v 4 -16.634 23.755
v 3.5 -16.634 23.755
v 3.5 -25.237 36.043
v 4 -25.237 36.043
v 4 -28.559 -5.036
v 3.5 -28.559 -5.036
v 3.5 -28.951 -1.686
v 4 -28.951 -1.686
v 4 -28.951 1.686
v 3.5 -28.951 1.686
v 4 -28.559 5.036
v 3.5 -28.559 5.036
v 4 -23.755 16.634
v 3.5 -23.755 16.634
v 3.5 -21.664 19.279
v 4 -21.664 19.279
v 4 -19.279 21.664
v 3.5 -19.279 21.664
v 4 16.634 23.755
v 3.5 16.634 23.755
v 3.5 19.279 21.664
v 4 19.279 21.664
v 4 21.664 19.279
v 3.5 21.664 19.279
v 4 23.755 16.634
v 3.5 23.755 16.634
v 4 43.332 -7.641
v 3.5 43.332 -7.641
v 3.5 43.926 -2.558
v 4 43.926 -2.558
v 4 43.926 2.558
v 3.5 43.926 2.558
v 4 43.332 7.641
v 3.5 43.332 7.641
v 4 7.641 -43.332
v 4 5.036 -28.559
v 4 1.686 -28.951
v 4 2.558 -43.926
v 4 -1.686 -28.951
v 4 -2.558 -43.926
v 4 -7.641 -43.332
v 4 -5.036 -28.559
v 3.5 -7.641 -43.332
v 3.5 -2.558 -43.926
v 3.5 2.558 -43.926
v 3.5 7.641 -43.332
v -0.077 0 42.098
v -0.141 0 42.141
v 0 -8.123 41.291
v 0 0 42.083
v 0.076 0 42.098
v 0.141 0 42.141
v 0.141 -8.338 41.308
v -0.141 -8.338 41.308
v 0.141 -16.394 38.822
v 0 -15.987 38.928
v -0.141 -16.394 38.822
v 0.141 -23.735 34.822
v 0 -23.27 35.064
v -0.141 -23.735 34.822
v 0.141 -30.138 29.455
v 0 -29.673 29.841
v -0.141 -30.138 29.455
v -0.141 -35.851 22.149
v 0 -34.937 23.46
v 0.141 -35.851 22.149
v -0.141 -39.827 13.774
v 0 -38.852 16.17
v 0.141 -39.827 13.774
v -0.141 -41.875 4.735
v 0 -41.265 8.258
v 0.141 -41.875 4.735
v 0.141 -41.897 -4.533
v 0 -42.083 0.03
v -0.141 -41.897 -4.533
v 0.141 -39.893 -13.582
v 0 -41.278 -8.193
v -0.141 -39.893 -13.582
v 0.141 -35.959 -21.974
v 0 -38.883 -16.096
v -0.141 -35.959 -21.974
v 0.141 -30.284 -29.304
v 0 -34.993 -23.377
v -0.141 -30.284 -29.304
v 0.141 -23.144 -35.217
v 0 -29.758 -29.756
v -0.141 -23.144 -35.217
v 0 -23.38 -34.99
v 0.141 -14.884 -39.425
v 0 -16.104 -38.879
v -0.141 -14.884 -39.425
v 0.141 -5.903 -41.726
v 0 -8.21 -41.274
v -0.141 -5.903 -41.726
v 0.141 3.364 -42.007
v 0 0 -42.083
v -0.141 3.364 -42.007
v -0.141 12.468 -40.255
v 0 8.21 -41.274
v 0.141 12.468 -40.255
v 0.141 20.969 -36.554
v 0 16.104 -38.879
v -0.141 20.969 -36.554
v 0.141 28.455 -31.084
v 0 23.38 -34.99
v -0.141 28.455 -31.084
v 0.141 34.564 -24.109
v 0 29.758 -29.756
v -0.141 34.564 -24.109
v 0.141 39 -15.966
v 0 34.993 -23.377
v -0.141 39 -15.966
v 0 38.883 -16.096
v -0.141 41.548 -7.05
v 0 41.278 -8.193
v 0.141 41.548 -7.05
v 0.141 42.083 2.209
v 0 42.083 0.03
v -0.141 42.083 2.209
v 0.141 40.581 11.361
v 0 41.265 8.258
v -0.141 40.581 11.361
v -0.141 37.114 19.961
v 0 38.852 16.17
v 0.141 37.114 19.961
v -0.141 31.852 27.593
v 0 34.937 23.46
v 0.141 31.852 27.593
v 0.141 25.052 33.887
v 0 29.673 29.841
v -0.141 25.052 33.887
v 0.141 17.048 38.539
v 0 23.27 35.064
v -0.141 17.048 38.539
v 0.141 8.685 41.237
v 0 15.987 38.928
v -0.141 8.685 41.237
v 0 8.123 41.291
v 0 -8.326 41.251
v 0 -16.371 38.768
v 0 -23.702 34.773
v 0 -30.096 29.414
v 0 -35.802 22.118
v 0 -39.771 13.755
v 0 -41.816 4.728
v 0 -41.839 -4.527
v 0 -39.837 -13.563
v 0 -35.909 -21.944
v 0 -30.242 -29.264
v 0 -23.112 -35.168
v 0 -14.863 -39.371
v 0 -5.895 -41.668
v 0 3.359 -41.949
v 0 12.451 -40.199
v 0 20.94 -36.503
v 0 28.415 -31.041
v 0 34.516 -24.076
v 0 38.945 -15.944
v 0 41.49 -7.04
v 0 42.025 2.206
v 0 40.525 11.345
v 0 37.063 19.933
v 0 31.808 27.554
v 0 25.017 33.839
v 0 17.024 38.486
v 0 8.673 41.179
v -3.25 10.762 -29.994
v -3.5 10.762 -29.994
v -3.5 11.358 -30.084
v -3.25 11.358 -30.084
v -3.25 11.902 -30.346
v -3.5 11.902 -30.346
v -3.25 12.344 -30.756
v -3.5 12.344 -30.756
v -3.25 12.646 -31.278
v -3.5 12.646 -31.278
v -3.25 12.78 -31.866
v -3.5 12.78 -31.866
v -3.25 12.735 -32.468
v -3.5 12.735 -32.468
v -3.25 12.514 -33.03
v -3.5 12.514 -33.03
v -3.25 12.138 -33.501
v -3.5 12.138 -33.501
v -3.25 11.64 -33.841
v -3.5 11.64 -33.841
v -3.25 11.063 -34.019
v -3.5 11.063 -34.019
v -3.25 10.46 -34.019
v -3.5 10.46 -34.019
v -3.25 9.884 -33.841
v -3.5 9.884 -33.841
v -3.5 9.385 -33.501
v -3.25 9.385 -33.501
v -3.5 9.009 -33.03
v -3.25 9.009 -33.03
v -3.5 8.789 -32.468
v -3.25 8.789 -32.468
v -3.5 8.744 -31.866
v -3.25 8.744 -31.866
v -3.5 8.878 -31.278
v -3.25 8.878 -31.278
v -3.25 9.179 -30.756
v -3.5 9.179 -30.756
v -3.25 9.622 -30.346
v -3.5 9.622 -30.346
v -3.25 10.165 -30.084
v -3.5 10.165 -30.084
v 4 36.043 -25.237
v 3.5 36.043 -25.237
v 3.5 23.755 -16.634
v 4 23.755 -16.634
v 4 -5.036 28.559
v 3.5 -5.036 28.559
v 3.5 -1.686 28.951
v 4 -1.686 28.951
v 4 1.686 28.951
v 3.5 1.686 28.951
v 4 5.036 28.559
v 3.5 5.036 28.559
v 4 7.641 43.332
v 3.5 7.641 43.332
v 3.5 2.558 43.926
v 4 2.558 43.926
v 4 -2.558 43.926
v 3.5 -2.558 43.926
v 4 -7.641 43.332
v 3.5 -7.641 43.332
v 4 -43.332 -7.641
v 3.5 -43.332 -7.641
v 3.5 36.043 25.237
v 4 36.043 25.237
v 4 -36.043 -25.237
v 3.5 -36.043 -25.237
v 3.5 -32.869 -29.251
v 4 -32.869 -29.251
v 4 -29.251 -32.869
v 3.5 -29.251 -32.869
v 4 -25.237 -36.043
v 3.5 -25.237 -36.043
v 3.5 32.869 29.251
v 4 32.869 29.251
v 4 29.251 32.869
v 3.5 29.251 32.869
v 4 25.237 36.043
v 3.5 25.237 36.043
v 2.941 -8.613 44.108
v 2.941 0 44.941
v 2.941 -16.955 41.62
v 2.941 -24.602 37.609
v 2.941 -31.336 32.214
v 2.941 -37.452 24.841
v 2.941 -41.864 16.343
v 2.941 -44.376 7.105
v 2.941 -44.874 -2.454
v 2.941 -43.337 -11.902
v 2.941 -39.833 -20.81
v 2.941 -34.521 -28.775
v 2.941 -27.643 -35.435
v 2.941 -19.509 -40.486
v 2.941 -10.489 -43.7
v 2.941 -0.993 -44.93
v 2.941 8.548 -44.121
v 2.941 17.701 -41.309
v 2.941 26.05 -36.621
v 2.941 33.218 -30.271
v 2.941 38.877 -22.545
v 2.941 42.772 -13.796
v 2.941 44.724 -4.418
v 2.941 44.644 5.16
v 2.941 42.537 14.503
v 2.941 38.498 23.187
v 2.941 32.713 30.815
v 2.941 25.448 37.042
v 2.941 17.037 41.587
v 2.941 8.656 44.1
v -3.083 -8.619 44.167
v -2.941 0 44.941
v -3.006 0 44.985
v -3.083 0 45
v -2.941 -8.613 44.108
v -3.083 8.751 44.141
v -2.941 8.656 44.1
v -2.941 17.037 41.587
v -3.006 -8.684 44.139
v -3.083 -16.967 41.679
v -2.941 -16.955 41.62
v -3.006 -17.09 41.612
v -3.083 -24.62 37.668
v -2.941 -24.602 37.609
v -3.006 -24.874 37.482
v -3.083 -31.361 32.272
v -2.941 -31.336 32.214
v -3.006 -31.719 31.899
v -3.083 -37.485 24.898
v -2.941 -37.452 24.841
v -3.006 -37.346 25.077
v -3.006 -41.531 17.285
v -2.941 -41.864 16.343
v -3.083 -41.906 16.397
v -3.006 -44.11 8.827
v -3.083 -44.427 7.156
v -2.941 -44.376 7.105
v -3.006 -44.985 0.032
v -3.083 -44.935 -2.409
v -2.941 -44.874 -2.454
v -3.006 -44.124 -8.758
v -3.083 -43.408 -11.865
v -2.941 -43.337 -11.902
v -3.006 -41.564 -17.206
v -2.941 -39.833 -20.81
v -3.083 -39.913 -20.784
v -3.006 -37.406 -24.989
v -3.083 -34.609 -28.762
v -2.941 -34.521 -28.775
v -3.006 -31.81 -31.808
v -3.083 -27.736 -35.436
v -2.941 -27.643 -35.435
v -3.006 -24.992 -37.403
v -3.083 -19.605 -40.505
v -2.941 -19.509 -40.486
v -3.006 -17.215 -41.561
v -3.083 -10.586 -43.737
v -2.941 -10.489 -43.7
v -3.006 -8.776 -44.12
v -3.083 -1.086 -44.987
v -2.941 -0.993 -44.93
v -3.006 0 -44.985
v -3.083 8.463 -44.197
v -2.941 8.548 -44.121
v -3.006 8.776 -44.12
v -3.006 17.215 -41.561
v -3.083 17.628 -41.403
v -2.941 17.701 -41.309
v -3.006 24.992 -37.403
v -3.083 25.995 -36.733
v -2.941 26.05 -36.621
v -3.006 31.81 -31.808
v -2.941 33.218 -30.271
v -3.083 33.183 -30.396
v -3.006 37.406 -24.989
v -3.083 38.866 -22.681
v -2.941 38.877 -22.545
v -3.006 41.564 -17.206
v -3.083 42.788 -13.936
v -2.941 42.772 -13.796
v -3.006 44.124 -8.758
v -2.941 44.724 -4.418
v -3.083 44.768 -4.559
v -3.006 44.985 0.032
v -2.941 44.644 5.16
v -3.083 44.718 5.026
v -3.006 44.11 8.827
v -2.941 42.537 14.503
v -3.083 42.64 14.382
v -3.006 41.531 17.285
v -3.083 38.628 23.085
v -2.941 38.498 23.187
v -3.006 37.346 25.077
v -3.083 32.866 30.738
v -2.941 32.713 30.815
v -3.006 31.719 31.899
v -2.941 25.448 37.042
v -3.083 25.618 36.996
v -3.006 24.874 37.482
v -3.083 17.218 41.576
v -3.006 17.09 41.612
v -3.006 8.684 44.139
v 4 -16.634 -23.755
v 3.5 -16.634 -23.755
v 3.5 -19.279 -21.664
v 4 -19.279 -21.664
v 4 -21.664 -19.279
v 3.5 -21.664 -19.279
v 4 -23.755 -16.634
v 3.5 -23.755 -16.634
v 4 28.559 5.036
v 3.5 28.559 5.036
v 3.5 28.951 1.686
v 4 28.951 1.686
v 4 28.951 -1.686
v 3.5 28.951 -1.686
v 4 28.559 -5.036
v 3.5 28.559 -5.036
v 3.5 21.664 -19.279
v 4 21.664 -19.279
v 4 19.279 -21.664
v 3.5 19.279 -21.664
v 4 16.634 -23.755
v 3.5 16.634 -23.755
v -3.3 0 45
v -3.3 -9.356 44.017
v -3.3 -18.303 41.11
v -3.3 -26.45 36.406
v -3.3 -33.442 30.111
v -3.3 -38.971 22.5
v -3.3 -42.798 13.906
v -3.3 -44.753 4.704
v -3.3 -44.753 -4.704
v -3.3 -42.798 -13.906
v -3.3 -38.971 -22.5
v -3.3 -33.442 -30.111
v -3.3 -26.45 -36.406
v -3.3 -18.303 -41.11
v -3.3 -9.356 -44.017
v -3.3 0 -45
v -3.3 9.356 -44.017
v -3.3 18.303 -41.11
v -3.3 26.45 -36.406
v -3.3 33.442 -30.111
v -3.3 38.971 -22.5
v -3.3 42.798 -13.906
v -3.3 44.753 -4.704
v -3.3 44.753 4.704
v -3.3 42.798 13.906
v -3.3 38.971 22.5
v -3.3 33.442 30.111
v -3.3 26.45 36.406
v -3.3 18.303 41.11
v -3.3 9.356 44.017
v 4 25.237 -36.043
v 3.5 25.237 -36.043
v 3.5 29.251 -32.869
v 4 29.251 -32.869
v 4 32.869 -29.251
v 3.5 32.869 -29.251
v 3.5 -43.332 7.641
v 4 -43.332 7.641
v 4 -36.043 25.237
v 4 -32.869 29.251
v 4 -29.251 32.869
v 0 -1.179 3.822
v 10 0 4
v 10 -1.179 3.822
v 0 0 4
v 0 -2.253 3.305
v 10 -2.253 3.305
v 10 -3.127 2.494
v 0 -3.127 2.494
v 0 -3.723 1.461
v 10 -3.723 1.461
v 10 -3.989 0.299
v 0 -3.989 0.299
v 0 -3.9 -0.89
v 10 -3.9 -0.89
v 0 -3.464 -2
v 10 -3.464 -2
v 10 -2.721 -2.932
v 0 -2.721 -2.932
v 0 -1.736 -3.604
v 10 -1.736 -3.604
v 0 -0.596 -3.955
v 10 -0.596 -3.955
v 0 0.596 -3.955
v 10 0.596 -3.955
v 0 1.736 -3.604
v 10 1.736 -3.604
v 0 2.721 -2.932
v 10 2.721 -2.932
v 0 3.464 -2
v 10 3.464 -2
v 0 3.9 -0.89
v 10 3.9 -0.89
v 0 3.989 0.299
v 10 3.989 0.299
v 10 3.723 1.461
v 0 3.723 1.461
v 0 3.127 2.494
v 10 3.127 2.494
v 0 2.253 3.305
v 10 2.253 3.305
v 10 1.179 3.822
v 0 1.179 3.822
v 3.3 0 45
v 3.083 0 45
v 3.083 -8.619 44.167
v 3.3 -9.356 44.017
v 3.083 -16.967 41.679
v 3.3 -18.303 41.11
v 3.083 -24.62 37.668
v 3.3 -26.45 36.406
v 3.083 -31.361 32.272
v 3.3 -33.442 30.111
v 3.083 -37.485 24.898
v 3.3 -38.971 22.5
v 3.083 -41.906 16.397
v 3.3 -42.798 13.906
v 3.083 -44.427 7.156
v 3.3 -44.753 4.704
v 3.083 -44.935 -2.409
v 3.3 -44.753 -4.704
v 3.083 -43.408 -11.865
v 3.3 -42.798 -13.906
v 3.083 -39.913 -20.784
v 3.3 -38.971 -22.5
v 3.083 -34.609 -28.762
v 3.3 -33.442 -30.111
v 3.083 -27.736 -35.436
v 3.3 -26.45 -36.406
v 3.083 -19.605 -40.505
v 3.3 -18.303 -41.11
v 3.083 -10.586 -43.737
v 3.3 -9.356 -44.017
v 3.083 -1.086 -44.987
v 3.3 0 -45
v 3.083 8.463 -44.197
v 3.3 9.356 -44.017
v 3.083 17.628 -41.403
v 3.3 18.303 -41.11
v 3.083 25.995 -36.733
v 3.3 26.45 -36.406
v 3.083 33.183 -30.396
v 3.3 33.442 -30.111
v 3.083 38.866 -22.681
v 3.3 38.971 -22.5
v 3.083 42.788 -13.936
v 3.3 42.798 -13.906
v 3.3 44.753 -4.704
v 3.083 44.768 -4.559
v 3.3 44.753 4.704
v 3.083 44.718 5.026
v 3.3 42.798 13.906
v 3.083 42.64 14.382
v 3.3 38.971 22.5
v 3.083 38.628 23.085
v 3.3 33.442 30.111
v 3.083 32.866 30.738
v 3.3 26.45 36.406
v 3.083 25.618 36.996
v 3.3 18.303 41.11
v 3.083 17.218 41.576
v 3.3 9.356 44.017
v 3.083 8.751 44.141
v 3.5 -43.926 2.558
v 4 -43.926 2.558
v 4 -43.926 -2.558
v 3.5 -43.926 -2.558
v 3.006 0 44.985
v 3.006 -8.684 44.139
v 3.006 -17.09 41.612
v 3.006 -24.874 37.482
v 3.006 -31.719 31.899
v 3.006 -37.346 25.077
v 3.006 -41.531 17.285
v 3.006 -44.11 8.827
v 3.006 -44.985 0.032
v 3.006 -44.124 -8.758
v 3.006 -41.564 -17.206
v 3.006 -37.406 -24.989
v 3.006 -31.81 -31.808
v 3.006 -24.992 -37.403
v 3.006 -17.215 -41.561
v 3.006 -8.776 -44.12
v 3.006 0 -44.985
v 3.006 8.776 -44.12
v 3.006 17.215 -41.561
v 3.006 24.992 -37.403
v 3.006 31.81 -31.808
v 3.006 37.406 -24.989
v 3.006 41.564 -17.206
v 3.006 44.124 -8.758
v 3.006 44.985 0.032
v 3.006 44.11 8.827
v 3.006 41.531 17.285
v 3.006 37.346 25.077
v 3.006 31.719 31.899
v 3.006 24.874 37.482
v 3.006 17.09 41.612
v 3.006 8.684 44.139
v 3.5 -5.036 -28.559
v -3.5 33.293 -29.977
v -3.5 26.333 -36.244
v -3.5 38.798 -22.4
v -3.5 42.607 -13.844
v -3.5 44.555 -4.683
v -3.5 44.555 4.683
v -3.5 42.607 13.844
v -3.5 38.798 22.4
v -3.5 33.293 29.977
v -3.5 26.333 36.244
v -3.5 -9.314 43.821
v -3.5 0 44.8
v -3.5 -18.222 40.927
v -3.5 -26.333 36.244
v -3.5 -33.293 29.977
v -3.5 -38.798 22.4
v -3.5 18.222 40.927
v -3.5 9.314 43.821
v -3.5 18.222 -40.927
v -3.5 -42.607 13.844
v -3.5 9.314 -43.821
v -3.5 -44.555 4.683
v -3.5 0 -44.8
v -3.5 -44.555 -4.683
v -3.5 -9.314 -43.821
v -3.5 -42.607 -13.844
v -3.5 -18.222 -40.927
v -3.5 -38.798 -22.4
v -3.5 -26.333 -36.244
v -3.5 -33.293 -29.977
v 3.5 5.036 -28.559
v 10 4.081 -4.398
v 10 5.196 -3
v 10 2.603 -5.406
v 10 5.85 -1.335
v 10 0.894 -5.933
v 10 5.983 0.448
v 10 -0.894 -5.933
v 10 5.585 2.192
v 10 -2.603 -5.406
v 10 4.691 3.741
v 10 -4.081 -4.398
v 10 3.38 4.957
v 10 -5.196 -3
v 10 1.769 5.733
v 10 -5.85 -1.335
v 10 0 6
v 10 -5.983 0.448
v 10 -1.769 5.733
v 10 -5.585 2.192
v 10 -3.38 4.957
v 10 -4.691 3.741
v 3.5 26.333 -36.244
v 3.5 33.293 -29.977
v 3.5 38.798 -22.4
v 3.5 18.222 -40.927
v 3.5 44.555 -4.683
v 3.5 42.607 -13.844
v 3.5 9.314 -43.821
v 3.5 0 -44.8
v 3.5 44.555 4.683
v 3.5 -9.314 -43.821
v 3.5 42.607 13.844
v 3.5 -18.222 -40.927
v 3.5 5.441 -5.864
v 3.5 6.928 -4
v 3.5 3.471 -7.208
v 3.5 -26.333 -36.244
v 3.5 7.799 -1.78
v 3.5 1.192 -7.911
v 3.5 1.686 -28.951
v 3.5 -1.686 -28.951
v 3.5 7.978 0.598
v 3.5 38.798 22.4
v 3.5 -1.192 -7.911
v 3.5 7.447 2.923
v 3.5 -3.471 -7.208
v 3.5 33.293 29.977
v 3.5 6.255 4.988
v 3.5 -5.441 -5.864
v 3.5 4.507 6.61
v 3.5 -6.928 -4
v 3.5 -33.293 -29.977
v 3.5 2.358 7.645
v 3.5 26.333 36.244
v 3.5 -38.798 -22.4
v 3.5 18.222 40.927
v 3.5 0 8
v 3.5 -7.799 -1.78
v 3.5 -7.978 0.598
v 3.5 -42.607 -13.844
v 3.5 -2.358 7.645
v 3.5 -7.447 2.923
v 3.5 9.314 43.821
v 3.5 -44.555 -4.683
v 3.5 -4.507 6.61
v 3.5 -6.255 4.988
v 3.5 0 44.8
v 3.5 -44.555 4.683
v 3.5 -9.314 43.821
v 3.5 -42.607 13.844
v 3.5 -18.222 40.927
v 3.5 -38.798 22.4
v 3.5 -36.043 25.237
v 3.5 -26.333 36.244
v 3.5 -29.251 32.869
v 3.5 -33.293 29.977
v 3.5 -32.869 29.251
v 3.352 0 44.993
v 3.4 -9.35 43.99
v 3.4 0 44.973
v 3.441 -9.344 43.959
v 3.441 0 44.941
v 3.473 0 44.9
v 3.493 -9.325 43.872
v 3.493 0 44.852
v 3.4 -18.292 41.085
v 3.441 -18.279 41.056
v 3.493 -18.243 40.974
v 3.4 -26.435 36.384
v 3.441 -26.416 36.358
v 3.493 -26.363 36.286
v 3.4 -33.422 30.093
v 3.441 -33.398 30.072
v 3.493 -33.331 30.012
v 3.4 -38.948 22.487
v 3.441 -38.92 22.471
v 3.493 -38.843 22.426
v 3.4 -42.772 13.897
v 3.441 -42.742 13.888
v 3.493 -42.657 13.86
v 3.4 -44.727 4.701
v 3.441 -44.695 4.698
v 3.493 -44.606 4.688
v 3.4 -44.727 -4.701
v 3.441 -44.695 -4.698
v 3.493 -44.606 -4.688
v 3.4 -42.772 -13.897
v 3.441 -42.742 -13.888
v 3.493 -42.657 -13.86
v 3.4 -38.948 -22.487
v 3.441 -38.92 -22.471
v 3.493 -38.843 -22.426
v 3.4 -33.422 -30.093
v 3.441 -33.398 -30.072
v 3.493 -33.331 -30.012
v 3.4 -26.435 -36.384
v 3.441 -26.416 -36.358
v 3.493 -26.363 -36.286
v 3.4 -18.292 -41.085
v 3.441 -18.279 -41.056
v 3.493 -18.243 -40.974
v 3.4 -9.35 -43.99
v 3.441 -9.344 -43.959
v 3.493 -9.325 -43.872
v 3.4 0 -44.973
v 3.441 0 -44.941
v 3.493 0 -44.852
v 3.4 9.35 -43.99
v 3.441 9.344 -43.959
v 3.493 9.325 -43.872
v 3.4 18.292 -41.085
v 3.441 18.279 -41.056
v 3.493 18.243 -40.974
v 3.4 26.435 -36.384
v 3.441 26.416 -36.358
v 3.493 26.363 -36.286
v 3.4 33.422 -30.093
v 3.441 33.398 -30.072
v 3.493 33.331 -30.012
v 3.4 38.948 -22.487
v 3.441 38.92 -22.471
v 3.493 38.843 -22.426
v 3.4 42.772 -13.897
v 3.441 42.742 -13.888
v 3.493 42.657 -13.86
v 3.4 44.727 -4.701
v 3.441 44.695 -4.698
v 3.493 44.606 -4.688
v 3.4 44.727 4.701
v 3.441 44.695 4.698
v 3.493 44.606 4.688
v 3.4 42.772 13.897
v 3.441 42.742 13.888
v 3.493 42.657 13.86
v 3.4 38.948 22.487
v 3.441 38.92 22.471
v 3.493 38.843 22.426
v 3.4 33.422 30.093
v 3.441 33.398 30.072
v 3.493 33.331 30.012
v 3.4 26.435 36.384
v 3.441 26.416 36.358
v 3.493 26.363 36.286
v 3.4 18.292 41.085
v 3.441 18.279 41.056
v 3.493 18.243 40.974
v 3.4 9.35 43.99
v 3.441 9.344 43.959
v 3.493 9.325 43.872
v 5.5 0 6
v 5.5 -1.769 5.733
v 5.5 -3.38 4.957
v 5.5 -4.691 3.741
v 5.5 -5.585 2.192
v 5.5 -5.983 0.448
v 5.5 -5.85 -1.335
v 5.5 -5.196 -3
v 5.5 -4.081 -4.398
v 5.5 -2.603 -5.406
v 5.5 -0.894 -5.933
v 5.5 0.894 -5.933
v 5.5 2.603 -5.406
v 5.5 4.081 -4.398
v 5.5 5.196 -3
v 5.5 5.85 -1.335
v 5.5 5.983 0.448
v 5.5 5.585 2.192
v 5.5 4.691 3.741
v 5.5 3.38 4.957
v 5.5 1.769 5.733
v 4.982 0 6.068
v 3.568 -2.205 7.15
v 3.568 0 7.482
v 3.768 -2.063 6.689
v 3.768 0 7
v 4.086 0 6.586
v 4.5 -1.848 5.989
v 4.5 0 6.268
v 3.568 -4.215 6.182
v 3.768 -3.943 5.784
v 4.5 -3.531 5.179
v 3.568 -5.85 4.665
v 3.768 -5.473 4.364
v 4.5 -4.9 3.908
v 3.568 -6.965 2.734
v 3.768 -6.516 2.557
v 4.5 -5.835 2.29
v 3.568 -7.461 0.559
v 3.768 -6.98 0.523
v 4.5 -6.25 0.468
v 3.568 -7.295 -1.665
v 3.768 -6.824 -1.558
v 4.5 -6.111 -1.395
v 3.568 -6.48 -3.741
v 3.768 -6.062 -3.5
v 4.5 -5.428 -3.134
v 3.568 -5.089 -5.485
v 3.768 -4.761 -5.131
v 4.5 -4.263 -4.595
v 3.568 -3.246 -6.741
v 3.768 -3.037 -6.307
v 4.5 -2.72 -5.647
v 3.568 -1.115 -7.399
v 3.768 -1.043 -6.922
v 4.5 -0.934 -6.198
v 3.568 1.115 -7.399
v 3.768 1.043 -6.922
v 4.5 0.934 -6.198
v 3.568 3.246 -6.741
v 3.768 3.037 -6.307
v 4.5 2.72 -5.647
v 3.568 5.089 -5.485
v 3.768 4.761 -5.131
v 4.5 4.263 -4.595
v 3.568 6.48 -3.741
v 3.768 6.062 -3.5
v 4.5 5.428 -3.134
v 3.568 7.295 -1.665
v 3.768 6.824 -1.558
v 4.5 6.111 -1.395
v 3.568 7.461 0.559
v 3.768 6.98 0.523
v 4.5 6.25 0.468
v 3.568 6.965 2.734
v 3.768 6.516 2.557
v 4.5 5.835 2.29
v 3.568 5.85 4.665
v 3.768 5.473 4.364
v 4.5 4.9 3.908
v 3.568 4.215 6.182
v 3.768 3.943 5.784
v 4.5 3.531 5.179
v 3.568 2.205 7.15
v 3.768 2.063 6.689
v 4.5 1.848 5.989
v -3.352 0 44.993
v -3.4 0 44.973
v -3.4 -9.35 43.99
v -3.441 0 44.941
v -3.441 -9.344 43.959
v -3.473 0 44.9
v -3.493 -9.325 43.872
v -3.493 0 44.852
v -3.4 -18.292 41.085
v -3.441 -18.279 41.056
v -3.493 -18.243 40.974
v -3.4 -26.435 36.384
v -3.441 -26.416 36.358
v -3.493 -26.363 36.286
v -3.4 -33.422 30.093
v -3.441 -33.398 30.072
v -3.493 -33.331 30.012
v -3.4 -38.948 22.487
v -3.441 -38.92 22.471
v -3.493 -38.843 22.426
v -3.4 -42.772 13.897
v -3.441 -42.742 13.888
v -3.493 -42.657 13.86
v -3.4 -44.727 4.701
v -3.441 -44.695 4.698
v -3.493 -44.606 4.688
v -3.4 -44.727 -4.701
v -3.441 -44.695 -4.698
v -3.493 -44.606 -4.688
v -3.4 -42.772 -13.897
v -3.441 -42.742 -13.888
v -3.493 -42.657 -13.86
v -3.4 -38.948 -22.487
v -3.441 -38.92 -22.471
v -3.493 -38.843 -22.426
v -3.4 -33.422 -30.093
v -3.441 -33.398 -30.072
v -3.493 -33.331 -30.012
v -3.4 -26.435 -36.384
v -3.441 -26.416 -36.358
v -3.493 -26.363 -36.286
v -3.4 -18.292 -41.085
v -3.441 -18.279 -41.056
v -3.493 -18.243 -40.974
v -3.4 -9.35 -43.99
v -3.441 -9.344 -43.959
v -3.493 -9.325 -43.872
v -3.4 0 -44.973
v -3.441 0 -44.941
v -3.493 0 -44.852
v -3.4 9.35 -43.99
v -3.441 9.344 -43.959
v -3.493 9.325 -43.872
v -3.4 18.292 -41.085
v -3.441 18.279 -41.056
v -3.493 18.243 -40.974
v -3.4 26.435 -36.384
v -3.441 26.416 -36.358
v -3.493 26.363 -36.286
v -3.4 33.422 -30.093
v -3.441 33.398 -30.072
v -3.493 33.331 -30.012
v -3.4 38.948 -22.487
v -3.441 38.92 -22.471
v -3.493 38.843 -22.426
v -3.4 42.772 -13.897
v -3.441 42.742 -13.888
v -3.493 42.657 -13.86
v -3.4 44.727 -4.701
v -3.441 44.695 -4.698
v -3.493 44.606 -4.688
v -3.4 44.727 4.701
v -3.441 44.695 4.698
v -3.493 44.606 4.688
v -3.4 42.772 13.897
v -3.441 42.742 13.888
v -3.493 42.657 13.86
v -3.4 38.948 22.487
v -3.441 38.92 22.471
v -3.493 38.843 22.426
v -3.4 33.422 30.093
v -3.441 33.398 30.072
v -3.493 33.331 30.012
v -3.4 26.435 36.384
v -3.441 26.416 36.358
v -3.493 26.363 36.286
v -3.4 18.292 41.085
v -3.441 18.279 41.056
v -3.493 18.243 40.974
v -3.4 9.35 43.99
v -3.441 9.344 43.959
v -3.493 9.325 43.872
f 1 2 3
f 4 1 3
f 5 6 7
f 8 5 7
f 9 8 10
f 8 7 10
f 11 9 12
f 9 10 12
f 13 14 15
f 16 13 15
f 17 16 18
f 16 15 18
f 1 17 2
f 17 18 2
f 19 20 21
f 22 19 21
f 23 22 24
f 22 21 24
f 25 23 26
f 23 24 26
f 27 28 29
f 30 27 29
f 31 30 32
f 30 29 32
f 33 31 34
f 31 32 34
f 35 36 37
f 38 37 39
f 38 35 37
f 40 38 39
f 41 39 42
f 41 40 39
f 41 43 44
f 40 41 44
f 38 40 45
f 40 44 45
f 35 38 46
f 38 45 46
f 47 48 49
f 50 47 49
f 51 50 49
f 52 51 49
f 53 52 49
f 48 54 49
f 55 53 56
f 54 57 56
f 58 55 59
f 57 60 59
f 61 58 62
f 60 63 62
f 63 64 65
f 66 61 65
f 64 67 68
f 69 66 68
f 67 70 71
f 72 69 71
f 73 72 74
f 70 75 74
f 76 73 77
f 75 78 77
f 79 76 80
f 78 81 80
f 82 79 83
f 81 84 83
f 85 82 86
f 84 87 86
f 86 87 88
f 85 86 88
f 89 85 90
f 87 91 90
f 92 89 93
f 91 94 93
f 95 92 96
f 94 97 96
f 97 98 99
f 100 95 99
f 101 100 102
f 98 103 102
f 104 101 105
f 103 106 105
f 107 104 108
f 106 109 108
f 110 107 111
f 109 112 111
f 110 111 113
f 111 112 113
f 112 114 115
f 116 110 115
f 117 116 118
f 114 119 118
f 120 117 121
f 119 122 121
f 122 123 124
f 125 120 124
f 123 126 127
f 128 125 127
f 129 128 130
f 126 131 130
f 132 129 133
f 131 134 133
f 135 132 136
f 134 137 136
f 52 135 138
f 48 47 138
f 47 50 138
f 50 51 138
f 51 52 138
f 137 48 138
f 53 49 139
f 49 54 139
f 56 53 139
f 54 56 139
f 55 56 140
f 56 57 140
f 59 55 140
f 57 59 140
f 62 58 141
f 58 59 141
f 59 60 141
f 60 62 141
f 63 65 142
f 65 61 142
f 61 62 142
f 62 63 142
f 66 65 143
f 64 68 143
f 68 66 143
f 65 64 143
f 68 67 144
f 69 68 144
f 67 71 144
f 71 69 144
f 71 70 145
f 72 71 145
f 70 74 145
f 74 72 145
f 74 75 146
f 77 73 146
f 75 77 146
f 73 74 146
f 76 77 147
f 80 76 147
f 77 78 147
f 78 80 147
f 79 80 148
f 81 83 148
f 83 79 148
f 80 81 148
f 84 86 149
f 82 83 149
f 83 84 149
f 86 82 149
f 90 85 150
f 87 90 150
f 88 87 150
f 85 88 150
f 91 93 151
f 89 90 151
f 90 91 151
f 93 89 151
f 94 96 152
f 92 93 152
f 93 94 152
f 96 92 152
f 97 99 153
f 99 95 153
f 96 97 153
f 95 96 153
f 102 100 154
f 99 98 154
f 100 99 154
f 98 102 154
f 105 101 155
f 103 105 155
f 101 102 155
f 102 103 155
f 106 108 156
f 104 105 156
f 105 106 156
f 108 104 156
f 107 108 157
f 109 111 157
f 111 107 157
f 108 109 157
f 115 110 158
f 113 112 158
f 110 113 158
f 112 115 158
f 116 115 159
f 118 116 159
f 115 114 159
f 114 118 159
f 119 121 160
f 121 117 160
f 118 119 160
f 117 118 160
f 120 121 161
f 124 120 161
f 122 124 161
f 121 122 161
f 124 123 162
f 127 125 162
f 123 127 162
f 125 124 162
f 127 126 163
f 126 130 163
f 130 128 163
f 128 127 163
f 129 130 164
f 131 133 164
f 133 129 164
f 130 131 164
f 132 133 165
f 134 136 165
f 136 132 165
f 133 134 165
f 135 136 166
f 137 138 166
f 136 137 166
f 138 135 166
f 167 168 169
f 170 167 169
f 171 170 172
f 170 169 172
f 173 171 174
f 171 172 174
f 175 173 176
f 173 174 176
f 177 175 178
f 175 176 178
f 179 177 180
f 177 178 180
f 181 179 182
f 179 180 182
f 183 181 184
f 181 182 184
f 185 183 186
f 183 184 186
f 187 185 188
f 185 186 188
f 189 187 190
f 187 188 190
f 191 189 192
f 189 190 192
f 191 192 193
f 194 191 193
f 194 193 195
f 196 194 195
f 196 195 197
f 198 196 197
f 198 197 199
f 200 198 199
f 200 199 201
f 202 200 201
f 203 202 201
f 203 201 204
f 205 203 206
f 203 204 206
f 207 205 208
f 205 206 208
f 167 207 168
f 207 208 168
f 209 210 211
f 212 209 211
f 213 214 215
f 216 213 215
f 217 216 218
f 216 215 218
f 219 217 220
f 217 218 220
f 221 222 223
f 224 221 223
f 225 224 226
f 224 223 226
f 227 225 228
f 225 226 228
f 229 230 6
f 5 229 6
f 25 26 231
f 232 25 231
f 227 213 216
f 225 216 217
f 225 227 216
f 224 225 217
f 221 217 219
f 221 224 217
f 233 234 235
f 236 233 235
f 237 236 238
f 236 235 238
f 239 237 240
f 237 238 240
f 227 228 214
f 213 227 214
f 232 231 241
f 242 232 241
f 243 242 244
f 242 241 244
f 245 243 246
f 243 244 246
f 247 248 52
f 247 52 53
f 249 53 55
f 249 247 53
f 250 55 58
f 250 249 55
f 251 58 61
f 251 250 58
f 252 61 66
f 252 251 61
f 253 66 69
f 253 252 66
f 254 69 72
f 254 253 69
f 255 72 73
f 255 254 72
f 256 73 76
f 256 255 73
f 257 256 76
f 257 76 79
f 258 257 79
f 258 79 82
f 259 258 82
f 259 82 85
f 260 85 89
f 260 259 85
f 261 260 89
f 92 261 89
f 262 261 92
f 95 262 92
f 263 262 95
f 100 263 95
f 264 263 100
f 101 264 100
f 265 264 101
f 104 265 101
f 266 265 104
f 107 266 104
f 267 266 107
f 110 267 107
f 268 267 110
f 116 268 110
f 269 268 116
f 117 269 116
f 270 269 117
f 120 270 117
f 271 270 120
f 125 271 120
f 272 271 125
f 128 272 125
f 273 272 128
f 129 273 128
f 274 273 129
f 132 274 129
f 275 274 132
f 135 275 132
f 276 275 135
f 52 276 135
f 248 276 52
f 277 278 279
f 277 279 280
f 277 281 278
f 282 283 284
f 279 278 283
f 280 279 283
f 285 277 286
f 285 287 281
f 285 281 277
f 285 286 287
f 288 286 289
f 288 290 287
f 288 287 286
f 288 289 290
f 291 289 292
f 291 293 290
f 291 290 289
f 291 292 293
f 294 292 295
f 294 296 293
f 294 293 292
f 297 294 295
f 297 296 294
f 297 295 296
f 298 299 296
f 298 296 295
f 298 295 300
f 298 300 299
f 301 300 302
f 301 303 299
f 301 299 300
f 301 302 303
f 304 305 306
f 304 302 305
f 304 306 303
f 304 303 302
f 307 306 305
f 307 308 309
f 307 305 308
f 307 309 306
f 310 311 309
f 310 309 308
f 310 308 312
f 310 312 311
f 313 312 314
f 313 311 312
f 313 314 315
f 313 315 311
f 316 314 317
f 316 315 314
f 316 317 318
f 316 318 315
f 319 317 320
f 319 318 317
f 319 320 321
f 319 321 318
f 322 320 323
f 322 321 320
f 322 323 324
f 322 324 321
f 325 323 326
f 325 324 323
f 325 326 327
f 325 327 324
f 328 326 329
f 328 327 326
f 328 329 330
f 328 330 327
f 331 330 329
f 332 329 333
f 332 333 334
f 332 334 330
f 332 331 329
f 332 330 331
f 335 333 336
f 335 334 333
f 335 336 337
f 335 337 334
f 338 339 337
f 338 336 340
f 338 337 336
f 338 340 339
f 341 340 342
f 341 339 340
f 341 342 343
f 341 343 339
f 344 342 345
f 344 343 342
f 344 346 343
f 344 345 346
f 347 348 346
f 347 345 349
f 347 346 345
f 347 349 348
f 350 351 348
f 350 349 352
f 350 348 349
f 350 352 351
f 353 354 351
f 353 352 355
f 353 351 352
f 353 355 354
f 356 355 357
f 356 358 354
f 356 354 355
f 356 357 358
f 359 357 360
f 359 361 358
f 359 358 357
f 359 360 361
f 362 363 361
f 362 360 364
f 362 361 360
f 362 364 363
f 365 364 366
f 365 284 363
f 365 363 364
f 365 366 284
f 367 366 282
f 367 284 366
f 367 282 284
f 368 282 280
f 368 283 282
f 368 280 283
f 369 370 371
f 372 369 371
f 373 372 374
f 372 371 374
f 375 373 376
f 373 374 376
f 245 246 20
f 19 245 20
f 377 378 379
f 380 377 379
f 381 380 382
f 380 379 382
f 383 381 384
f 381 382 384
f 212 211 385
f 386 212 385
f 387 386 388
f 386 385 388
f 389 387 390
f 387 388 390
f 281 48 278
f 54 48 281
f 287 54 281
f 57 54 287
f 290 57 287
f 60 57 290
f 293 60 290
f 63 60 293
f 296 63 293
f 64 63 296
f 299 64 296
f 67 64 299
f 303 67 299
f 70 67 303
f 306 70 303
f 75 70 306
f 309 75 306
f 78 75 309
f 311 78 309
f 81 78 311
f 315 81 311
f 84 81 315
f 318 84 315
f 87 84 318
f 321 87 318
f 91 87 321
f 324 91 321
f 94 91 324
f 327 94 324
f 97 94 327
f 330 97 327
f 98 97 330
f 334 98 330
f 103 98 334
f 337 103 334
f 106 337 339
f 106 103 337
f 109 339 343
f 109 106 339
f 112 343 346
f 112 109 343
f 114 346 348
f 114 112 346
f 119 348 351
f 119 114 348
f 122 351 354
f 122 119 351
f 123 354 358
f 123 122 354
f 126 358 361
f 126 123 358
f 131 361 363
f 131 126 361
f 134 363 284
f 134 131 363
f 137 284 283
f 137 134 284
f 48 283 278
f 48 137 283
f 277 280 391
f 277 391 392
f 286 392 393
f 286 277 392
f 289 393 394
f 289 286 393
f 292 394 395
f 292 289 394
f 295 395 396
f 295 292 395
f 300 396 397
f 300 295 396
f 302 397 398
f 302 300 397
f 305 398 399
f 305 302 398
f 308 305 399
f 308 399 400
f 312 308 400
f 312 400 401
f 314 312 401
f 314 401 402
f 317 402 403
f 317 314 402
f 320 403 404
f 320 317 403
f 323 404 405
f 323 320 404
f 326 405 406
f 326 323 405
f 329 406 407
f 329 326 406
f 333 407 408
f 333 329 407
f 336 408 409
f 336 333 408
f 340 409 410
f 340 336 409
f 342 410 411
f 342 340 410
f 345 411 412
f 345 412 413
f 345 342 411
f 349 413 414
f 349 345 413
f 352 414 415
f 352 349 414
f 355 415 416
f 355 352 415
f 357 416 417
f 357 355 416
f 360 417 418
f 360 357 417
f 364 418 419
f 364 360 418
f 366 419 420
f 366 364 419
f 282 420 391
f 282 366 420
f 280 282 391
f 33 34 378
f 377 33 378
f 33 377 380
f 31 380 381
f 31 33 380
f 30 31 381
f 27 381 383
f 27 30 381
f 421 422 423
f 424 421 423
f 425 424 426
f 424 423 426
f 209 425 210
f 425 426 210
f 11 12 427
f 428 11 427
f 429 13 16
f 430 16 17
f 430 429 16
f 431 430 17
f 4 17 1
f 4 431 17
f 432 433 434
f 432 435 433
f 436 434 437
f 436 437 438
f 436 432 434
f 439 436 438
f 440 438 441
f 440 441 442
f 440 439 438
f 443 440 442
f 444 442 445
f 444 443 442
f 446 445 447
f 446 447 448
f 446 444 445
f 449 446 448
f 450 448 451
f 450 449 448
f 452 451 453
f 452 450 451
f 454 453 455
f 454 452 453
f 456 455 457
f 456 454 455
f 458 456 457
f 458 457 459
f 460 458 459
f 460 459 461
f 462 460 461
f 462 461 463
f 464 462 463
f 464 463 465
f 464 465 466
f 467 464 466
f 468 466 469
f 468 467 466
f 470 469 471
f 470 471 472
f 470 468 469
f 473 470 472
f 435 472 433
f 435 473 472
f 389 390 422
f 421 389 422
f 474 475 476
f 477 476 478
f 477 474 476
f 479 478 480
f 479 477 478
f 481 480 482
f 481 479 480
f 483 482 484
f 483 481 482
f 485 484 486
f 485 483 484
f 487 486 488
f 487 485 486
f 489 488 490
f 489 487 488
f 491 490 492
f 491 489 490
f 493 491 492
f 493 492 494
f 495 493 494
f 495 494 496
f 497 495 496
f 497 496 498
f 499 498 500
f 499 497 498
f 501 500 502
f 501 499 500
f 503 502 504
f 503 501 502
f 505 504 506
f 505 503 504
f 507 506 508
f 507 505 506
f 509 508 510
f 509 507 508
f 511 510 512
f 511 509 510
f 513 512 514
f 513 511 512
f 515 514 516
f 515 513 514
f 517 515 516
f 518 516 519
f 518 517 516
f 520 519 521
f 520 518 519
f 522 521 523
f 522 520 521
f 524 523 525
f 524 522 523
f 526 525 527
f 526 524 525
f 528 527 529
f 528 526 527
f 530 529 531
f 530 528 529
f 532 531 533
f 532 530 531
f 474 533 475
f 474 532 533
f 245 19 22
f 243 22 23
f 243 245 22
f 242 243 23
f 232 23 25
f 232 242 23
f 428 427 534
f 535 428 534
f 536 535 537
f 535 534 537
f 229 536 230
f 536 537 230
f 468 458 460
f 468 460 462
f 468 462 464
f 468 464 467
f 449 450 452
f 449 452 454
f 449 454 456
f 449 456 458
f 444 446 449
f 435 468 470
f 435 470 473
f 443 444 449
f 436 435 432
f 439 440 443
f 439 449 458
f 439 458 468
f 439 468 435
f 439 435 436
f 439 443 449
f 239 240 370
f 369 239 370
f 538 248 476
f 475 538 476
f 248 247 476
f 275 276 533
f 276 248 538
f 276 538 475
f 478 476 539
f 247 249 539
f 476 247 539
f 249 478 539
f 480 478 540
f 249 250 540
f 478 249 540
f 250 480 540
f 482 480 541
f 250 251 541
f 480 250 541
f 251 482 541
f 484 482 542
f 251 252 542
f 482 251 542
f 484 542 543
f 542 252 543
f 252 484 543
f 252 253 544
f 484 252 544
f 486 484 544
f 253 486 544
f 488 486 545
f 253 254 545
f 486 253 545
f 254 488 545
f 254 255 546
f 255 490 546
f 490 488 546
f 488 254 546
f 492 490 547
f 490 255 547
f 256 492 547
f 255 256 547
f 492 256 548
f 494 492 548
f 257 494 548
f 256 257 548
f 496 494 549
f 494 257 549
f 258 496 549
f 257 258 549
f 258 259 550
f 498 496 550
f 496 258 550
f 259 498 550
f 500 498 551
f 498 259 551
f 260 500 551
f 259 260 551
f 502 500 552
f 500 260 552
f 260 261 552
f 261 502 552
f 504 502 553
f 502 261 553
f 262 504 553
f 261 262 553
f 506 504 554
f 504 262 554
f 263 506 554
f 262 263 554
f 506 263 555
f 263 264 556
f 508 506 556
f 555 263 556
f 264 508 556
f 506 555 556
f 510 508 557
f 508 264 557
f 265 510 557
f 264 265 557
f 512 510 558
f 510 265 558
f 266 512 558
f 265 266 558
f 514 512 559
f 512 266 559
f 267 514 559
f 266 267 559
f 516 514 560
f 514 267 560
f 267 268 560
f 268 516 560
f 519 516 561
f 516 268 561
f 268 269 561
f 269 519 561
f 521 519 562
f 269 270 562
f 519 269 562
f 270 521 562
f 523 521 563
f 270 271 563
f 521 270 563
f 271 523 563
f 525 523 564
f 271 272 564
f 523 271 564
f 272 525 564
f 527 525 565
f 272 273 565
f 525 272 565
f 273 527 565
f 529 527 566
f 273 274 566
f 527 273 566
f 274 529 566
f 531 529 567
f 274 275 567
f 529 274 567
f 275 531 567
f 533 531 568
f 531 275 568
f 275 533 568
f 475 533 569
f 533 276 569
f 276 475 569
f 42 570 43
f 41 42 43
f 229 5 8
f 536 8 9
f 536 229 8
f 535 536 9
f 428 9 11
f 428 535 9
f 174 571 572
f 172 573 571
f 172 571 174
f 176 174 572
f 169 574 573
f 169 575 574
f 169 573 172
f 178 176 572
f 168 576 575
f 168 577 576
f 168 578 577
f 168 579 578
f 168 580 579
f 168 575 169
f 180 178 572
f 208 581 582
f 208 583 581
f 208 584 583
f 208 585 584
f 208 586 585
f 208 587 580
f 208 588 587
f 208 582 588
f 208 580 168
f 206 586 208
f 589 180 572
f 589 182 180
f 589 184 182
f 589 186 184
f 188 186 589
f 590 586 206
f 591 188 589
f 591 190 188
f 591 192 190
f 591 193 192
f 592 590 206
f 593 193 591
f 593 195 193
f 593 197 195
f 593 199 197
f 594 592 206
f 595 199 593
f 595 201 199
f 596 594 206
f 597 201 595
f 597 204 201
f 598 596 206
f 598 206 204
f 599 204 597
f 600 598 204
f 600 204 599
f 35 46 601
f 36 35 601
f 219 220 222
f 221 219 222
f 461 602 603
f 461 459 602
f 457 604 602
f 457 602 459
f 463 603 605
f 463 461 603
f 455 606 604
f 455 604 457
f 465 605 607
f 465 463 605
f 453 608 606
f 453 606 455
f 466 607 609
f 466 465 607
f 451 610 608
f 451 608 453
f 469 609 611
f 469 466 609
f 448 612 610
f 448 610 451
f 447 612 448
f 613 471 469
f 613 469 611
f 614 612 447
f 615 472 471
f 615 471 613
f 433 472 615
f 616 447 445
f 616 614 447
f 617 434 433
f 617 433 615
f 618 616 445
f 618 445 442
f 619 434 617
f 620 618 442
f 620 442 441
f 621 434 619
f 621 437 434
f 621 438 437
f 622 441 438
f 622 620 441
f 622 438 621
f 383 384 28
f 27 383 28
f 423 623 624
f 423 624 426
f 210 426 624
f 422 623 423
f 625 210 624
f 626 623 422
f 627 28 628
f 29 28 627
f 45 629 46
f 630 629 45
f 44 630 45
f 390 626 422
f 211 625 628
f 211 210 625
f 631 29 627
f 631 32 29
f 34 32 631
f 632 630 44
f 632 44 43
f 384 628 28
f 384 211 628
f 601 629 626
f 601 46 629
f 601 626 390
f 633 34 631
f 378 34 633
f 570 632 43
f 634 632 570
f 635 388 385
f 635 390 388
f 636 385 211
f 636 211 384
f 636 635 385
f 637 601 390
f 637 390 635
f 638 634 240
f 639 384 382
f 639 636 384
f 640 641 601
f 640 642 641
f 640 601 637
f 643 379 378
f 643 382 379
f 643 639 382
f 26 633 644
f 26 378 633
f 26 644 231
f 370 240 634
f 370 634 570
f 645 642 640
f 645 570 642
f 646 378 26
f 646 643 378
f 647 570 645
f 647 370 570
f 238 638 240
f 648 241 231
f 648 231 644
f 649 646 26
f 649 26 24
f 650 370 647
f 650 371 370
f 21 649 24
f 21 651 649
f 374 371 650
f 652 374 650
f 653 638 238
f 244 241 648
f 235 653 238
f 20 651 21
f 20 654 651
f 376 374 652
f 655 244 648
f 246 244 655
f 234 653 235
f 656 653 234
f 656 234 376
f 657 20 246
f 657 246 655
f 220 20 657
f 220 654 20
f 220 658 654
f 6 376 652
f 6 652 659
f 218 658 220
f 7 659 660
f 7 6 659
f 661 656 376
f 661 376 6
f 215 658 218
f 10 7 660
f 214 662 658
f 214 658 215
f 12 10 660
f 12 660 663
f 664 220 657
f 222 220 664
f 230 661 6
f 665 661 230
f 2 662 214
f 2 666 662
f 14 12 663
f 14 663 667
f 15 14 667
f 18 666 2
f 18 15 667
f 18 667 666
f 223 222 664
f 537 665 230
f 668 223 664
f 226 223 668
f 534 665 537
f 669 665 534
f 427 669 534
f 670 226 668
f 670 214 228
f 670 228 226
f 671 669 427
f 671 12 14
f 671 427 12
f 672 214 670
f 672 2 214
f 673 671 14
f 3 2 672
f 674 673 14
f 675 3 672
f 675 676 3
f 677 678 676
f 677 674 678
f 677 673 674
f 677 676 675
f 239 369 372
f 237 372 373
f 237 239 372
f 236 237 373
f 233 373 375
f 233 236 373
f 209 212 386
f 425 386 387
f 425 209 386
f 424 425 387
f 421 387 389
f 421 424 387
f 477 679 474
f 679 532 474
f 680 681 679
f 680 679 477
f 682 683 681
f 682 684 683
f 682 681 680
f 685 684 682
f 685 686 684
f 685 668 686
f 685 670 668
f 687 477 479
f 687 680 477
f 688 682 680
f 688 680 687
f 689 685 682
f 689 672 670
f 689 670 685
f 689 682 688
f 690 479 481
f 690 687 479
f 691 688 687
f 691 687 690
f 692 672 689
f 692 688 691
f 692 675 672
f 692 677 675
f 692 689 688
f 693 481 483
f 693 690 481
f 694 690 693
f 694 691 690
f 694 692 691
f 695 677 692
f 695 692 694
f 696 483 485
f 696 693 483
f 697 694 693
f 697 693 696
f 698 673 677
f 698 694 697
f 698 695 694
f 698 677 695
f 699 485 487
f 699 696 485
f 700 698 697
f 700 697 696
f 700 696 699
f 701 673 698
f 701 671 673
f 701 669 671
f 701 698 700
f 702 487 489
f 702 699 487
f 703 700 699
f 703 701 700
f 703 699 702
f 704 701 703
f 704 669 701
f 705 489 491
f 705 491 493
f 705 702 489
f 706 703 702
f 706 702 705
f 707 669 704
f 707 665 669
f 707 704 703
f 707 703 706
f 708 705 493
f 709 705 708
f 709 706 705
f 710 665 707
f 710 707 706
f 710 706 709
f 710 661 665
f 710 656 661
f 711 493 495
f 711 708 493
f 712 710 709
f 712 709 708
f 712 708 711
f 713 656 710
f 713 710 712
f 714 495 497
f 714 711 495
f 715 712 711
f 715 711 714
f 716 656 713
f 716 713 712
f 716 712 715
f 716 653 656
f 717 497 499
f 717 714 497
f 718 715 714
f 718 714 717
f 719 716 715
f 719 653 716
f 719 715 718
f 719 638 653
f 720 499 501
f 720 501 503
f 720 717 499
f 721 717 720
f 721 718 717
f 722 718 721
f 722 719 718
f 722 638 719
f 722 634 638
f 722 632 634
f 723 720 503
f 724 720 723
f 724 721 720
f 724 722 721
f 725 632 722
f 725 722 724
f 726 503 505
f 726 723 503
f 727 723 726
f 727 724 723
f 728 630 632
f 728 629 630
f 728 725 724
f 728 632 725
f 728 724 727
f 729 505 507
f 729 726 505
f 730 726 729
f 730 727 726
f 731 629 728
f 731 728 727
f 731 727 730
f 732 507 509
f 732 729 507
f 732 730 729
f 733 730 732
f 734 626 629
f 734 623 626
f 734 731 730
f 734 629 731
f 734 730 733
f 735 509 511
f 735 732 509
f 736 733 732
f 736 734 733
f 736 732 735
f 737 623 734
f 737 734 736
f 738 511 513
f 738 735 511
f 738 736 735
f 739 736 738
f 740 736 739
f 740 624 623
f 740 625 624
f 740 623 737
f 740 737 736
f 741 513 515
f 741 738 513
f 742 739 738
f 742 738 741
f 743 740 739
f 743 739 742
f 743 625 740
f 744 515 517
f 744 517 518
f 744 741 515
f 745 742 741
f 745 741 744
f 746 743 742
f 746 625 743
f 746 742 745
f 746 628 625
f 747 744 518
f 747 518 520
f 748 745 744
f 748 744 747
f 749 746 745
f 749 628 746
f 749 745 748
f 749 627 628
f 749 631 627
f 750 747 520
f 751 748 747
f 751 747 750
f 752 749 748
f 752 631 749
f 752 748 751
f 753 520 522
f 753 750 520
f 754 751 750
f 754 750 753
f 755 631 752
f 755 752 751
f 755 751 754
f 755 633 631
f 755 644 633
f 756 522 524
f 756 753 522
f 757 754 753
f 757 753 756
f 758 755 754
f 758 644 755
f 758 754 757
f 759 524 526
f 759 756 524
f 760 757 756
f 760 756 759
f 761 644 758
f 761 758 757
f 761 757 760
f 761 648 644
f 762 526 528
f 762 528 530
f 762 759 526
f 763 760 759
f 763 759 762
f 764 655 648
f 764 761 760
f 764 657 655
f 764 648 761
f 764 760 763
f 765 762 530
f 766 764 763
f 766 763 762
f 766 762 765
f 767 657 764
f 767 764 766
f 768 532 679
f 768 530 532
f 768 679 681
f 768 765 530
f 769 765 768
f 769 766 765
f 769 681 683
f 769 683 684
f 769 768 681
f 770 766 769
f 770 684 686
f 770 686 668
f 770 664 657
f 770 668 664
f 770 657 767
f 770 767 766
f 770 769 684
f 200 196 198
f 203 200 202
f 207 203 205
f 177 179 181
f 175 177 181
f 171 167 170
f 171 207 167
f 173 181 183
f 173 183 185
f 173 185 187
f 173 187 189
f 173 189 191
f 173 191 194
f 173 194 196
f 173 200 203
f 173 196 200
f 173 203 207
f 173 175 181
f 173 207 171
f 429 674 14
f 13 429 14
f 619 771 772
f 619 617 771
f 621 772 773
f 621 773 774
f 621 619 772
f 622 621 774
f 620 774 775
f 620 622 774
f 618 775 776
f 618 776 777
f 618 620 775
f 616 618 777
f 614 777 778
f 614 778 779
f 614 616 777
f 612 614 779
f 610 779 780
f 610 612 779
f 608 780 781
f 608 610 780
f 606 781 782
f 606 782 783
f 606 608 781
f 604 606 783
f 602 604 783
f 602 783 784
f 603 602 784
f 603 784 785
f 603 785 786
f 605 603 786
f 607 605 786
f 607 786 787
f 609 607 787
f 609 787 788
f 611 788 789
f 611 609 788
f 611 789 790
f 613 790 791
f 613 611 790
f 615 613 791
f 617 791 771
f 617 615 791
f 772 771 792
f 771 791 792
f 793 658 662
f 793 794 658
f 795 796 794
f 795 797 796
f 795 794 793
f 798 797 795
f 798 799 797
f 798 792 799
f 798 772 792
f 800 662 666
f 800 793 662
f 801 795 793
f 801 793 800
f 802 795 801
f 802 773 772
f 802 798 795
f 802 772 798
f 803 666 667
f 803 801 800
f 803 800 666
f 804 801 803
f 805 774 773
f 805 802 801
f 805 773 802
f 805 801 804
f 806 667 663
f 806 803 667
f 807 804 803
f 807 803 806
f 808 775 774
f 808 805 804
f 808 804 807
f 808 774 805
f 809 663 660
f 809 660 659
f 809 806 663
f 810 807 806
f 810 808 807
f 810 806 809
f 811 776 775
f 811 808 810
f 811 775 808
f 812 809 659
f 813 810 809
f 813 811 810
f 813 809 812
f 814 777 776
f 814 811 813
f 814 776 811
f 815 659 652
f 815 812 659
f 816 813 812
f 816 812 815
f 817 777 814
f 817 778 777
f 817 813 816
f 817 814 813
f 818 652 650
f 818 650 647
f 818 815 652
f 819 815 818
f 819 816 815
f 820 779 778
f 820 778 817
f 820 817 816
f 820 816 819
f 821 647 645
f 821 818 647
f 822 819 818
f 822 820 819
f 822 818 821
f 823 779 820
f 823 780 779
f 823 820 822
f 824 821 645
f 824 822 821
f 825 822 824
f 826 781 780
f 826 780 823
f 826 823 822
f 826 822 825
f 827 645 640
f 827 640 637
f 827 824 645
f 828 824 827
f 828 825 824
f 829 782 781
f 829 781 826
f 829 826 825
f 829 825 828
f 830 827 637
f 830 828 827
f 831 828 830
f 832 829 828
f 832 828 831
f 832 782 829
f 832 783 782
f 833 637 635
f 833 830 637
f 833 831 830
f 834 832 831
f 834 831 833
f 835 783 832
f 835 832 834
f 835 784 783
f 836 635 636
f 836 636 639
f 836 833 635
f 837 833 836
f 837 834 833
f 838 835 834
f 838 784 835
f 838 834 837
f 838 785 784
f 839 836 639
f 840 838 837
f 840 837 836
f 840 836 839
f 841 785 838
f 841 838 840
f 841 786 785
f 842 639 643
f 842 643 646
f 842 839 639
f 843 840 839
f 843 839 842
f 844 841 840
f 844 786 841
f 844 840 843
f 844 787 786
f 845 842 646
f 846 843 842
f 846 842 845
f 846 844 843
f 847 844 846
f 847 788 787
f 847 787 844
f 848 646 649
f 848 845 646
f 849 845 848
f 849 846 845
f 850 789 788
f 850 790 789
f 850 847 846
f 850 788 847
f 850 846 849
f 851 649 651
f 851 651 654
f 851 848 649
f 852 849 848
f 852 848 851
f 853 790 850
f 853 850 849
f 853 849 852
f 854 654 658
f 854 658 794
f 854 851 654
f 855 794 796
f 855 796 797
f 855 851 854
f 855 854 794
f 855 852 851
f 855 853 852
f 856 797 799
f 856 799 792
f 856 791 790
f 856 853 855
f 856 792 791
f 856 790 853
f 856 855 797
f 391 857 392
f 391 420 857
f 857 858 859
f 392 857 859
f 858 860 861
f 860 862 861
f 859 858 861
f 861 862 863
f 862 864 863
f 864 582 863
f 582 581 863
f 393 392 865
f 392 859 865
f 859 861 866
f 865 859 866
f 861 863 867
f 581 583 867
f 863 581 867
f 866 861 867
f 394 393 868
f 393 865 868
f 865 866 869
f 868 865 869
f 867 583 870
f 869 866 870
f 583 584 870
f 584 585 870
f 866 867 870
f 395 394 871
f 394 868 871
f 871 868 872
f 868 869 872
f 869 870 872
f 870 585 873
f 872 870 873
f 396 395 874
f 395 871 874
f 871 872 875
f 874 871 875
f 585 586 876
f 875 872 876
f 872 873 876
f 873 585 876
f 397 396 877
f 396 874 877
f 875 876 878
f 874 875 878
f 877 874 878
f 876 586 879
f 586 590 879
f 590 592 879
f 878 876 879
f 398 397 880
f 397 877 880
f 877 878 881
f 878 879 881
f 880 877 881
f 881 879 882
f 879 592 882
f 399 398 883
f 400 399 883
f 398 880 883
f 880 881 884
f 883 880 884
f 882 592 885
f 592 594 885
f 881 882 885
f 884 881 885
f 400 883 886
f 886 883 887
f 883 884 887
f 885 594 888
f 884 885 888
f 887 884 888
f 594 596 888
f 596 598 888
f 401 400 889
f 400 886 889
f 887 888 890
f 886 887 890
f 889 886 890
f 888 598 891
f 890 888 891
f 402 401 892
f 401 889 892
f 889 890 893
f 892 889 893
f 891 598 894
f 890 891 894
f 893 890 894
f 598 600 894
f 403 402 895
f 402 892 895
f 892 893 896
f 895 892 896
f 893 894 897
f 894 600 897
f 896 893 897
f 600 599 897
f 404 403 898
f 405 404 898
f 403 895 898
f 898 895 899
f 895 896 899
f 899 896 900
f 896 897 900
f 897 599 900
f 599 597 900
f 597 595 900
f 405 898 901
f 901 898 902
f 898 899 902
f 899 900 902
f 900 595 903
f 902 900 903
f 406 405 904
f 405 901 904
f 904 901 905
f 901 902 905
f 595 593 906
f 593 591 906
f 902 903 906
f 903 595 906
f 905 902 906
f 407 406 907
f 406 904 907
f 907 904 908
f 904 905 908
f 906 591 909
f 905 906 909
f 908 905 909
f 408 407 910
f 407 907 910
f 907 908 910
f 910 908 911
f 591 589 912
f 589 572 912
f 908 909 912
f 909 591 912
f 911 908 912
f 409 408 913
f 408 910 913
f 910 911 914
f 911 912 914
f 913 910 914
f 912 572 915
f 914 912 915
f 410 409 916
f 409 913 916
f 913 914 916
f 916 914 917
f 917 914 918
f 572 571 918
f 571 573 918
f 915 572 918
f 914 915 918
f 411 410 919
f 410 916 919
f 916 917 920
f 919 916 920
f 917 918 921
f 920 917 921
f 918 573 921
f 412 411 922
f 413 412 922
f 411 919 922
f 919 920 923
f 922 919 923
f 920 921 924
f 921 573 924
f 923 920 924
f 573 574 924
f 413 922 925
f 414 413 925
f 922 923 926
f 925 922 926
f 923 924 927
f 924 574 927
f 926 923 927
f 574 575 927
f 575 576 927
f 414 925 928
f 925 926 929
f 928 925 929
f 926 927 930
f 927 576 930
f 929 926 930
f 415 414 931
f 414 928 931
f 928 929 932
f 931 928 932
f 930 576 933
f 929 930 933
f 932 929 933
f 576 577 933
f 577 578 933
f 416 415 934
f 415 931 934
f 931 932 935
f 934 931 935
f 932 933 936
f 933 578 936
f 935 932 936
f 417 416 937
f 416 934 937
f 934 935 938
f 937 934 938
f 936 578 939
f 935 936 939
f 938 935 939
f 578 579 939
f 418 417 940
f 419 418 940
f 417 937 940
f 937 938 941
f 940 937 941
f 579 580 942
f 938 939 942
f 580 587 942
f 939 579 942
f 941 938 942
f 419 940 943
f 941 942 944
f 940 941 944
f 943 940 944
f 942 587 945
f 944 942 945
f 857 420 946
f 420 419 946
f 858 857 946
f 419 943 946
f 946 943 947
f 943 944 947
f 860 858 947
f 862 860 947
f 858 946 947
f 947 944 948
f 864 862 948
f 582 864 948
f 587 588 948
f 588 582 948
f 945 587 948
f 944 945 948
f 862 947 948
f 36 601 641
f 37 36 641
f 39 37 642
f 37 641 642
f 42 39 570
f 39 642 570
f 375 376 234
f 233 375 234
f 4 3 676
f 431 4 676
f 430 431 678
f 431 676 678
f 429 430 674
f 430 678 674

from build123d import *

# Parameters (mm, degrees)
EXTRUSION1_DEPTH             = 0.5
R_P_TITION_CIRCULAIRE1_COUNT = 8
CONG_1_R                     = 0.2
ESQUISSE3_R                  = 2.023797345
ENL_V_MAT_EXTRU_1_DEPTH      = 0.25


with BuildPart() as part:
    # Esquisse1 → Révolution2 (revolve)
    with BuildSketch(Plane.XY, mode=Mode.PRIVATE) as r_volution2_sk:
        with BuildLine():
            Line((-3, 45), (0, 42))
            Line((0, 42), (3, 45))
            Line((3, 45), (3.5, 45))
            Line((3.5, 45), (3.5, 8))
            ThreePointArc((3.5, 8), (4.085786438, 6.585786438), (5.5, 6))
            Line((5.5, 6), (10, 6))
            Line((10, 6), (10, 4))
            Line((10, 4), (0, 4))
            Line((0, 4), (0, 0))
            Line((0, 0), (-3.5, 0))
            Line((-3.5, 0), (-3.5, 45))
            Line((-3.5, 45), (-3, 45))
        make_face()
    revolve(r_volution2_sk.sketch.rotate(Axis((0, 0, 0), (1, 0, 0)), 90), axis=Axis((0, 0, 0), (1, 0, 0)))

    # Esquisse2 → Extrusion1 (add)
    with BuildSketch(Plane(origin=(3.5, 0, 0), x_dir=(0, 0, -1), z_dir=(1, 0, 0))):
        with BuildLine():
            Line((5.035797152, 28.559424837), (7.640519817, 43.331541133))
            ThreePointArc((7.640519817, 43.331541133), (0, 44), (-7.640519817, 43.331541133))
            Line((-7.640519817, 43.331541133), (-5.035797152, 28.559424837))
            ThreePointArc((-5.035797152, 28.559424837), (0, 29), (5.035797152, 28.559424837))
        make_face()
    extrusion1 = extrude(amount=EXTRUSION1_DEPTH)

    # Répétition circulaire1: Extrusion1 ×8 about axis
    r_p_tition_circulaire1_axis = Axis((0, 0, 0), (1, 0, 0))
    for i in range(1, R_P_TITION_CIRCULAIRE1_COUNT):
        add(extrusion1.rotate(r_p_tition_circulaire1_axis, i * 360 / R_P_TITION_CIRCULAIRE1_COUNT))

    # Congé1
    cong_1_edges = [part.edges().sort_by_distance(p)[0] for p in [
        (-3, 0, -45),
        (0, 0, -42),
        (-3.5, 0, -45),
        (3, 0, -45),
        (3.5, 0, -45),
    ]]
    fillet(cong_1_edges, radius=CONG_1_R)

    # Esquisse3 → Enlèv. mat.-Extru.1 (cut)
    with BuildSketch(Plane.ZY.offset(3.5)):
        with Locations((-32.017661382, 10.761647975)):
            Circle(ESQUISSE3_R)
    extrude(amount=-ENL_V_MAT_EXTRU_1_DEPTH, mode=Mode.SUBTRACT)


solid = part.part
